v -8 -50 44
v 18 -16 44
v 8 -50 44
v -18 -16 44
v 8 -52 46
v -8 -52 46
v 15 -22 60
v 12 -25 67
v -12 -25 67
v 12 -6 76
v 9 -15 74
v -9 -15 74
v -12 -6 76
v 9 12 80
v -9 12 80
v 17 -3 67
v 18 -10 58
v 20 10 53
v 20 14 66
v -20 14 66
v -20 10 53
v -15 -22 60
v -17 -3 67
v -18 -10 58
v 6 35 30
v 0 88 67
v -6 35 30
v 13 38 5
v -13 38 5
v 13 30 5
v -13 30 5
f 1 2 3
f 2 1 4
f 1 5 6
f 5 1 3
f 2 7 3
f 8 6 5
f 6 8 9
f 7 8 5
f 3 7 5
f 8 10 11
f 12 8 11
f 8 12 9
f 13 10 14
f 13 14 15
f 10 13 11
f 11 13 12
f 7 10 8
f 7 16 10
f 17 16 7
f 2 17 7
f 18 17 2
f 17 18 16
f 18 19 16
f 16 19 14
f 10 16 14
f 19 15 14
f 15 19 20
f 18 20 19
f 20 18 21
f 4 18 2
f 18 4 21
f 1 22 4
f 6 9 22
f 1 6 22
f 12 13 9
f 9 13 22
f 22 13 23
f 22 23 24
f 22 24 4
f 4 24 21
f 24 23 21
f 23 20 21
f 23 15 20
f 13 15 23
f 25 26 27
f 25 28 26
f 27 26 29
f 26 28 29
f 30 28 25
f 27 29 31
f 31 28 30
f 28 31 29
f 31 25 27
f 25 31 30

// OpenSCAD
module bodyHalf()
{

	polyhedron(
		points=[ [16,31,5], [0,31,5], [0,34,23], [0,35,30], [18,35,30], 
			     [21,34,23], [21,-23,23], [11,-1,49], [0,-1,49], 
				 [13,-16,44],[0,-16,44], [0,-23,23],[0,-9,5], [16,-9,5]],

		faces=[ [0,2,1], [0,5,2], [2,5,4], [3,2,4], [4,5,6], [7,8,3], 
			    [3,4,7], [4,6,7], [8,7,9], [7,6,9], [10,8,9], [6,11,9],
				[10,9,11], [11,6,12], [6,13,12], [13,5,0], [6,5,13], 
				[0,1,12], [12,13,0], [1,3,8], [1,8,12], [11,12,10], 
				[8,10,12]]
	);
}

module tail()
{
	translate([0,-2,0])
		polyhedron(
		points=[ [0,90,67],[6,37,30], [-6,37,30],[13,40,5], [-13,40,5], 
				 [13,32,5], [-13,32,5]
				 ],

		faces=[ [0,1,2], [0,3,1], [0,2,4], [0,4,3],[1,3,5], [4,2,6], [3,6,5], 
				[3,4,6],[1,6,2], [1,5,6] ]
		);
}

module footLeft()
{
	polyhedron(
		points=[	[40,-20,0], [22,-20,0], [22,36,0], [40,36,0], [22,36,13], [40,36,8],
				[40,-20,6], [22,-20,9], [40,14,20], [22,14,25], [40,14,0]],

		faces=[ [2,1,0], [0,3,2], [2,3,4], [5,4,3], [1,6,0], [6,1,7], [6,7,8], [9,8,7],
				[9,5,8], [4,5,9], [0,6,10], [10,6,8], [5,3,10], [10,8,5], [4,9,2],
				[2,9,1], [1,9,7]
		]
	);
}

module headhalf()
{
	polyhedron(
		points = [[18,-16,44], [0,-16,44], [8,-50,44], [8,-52,46], [0,-50,44], [0,-52,46],
				  [15,-22,60], [12,-25,67], [0,-25,67], [0,-15,74], [9,-15,74], [12,-6,76],
                   [0,-6,76], [17,-3,67], [18,-10,58], [20,10,53], [20,14,66], [9,12,80],
				  [0,12,80], [0,14,66], [0,10,53]


		],
		faces = [ [0,1,2], [1,4,2], [2,4,3], [4,5,3], [0,2,6], [8,7,5], [3,5,7], [6,3,7],
				  [2,3,6], [7,10,11], [7,8,10], [8,9,10], [9,11,10], [9,12,11], [6,7,11],
				  [6,11,13], [6,13,14], [6,14,0], [0,14,15], [14,13,15], [13,16,15], [13,17,16],
				  [13,11,17], [11,12,17], [17,12,18], [17,18,19], [19,16,17], [15,16,20],
				  [20,16,19], [20,0,15], [1,0,20], [12,19,18], [12,20,19], [12,1,20], [12,9,1],
				  [8,1,9], [4,1,5], [1,8,5]
				]
	);
}

module body()
{
	union()
	{
		bodyHalf();
		mirror([1,0,0])
		{
			bodyHalf();
		}
	}
}

module feet()
{
	union()
	{
		translate([-7,0,0]) footLeft();
		mirror([1,0,0]){
			translate([-7,0,0]) footLeft();
		}
	}
}

module head()
{
	union()
	{
		headhalf();
		mirror([1,0,0])
		{
			headhalf();
		}
	}
}

module porygon()
{
	union()
	{
		head();
		body();
		tail();
		feet();
	}
}

porygon();
